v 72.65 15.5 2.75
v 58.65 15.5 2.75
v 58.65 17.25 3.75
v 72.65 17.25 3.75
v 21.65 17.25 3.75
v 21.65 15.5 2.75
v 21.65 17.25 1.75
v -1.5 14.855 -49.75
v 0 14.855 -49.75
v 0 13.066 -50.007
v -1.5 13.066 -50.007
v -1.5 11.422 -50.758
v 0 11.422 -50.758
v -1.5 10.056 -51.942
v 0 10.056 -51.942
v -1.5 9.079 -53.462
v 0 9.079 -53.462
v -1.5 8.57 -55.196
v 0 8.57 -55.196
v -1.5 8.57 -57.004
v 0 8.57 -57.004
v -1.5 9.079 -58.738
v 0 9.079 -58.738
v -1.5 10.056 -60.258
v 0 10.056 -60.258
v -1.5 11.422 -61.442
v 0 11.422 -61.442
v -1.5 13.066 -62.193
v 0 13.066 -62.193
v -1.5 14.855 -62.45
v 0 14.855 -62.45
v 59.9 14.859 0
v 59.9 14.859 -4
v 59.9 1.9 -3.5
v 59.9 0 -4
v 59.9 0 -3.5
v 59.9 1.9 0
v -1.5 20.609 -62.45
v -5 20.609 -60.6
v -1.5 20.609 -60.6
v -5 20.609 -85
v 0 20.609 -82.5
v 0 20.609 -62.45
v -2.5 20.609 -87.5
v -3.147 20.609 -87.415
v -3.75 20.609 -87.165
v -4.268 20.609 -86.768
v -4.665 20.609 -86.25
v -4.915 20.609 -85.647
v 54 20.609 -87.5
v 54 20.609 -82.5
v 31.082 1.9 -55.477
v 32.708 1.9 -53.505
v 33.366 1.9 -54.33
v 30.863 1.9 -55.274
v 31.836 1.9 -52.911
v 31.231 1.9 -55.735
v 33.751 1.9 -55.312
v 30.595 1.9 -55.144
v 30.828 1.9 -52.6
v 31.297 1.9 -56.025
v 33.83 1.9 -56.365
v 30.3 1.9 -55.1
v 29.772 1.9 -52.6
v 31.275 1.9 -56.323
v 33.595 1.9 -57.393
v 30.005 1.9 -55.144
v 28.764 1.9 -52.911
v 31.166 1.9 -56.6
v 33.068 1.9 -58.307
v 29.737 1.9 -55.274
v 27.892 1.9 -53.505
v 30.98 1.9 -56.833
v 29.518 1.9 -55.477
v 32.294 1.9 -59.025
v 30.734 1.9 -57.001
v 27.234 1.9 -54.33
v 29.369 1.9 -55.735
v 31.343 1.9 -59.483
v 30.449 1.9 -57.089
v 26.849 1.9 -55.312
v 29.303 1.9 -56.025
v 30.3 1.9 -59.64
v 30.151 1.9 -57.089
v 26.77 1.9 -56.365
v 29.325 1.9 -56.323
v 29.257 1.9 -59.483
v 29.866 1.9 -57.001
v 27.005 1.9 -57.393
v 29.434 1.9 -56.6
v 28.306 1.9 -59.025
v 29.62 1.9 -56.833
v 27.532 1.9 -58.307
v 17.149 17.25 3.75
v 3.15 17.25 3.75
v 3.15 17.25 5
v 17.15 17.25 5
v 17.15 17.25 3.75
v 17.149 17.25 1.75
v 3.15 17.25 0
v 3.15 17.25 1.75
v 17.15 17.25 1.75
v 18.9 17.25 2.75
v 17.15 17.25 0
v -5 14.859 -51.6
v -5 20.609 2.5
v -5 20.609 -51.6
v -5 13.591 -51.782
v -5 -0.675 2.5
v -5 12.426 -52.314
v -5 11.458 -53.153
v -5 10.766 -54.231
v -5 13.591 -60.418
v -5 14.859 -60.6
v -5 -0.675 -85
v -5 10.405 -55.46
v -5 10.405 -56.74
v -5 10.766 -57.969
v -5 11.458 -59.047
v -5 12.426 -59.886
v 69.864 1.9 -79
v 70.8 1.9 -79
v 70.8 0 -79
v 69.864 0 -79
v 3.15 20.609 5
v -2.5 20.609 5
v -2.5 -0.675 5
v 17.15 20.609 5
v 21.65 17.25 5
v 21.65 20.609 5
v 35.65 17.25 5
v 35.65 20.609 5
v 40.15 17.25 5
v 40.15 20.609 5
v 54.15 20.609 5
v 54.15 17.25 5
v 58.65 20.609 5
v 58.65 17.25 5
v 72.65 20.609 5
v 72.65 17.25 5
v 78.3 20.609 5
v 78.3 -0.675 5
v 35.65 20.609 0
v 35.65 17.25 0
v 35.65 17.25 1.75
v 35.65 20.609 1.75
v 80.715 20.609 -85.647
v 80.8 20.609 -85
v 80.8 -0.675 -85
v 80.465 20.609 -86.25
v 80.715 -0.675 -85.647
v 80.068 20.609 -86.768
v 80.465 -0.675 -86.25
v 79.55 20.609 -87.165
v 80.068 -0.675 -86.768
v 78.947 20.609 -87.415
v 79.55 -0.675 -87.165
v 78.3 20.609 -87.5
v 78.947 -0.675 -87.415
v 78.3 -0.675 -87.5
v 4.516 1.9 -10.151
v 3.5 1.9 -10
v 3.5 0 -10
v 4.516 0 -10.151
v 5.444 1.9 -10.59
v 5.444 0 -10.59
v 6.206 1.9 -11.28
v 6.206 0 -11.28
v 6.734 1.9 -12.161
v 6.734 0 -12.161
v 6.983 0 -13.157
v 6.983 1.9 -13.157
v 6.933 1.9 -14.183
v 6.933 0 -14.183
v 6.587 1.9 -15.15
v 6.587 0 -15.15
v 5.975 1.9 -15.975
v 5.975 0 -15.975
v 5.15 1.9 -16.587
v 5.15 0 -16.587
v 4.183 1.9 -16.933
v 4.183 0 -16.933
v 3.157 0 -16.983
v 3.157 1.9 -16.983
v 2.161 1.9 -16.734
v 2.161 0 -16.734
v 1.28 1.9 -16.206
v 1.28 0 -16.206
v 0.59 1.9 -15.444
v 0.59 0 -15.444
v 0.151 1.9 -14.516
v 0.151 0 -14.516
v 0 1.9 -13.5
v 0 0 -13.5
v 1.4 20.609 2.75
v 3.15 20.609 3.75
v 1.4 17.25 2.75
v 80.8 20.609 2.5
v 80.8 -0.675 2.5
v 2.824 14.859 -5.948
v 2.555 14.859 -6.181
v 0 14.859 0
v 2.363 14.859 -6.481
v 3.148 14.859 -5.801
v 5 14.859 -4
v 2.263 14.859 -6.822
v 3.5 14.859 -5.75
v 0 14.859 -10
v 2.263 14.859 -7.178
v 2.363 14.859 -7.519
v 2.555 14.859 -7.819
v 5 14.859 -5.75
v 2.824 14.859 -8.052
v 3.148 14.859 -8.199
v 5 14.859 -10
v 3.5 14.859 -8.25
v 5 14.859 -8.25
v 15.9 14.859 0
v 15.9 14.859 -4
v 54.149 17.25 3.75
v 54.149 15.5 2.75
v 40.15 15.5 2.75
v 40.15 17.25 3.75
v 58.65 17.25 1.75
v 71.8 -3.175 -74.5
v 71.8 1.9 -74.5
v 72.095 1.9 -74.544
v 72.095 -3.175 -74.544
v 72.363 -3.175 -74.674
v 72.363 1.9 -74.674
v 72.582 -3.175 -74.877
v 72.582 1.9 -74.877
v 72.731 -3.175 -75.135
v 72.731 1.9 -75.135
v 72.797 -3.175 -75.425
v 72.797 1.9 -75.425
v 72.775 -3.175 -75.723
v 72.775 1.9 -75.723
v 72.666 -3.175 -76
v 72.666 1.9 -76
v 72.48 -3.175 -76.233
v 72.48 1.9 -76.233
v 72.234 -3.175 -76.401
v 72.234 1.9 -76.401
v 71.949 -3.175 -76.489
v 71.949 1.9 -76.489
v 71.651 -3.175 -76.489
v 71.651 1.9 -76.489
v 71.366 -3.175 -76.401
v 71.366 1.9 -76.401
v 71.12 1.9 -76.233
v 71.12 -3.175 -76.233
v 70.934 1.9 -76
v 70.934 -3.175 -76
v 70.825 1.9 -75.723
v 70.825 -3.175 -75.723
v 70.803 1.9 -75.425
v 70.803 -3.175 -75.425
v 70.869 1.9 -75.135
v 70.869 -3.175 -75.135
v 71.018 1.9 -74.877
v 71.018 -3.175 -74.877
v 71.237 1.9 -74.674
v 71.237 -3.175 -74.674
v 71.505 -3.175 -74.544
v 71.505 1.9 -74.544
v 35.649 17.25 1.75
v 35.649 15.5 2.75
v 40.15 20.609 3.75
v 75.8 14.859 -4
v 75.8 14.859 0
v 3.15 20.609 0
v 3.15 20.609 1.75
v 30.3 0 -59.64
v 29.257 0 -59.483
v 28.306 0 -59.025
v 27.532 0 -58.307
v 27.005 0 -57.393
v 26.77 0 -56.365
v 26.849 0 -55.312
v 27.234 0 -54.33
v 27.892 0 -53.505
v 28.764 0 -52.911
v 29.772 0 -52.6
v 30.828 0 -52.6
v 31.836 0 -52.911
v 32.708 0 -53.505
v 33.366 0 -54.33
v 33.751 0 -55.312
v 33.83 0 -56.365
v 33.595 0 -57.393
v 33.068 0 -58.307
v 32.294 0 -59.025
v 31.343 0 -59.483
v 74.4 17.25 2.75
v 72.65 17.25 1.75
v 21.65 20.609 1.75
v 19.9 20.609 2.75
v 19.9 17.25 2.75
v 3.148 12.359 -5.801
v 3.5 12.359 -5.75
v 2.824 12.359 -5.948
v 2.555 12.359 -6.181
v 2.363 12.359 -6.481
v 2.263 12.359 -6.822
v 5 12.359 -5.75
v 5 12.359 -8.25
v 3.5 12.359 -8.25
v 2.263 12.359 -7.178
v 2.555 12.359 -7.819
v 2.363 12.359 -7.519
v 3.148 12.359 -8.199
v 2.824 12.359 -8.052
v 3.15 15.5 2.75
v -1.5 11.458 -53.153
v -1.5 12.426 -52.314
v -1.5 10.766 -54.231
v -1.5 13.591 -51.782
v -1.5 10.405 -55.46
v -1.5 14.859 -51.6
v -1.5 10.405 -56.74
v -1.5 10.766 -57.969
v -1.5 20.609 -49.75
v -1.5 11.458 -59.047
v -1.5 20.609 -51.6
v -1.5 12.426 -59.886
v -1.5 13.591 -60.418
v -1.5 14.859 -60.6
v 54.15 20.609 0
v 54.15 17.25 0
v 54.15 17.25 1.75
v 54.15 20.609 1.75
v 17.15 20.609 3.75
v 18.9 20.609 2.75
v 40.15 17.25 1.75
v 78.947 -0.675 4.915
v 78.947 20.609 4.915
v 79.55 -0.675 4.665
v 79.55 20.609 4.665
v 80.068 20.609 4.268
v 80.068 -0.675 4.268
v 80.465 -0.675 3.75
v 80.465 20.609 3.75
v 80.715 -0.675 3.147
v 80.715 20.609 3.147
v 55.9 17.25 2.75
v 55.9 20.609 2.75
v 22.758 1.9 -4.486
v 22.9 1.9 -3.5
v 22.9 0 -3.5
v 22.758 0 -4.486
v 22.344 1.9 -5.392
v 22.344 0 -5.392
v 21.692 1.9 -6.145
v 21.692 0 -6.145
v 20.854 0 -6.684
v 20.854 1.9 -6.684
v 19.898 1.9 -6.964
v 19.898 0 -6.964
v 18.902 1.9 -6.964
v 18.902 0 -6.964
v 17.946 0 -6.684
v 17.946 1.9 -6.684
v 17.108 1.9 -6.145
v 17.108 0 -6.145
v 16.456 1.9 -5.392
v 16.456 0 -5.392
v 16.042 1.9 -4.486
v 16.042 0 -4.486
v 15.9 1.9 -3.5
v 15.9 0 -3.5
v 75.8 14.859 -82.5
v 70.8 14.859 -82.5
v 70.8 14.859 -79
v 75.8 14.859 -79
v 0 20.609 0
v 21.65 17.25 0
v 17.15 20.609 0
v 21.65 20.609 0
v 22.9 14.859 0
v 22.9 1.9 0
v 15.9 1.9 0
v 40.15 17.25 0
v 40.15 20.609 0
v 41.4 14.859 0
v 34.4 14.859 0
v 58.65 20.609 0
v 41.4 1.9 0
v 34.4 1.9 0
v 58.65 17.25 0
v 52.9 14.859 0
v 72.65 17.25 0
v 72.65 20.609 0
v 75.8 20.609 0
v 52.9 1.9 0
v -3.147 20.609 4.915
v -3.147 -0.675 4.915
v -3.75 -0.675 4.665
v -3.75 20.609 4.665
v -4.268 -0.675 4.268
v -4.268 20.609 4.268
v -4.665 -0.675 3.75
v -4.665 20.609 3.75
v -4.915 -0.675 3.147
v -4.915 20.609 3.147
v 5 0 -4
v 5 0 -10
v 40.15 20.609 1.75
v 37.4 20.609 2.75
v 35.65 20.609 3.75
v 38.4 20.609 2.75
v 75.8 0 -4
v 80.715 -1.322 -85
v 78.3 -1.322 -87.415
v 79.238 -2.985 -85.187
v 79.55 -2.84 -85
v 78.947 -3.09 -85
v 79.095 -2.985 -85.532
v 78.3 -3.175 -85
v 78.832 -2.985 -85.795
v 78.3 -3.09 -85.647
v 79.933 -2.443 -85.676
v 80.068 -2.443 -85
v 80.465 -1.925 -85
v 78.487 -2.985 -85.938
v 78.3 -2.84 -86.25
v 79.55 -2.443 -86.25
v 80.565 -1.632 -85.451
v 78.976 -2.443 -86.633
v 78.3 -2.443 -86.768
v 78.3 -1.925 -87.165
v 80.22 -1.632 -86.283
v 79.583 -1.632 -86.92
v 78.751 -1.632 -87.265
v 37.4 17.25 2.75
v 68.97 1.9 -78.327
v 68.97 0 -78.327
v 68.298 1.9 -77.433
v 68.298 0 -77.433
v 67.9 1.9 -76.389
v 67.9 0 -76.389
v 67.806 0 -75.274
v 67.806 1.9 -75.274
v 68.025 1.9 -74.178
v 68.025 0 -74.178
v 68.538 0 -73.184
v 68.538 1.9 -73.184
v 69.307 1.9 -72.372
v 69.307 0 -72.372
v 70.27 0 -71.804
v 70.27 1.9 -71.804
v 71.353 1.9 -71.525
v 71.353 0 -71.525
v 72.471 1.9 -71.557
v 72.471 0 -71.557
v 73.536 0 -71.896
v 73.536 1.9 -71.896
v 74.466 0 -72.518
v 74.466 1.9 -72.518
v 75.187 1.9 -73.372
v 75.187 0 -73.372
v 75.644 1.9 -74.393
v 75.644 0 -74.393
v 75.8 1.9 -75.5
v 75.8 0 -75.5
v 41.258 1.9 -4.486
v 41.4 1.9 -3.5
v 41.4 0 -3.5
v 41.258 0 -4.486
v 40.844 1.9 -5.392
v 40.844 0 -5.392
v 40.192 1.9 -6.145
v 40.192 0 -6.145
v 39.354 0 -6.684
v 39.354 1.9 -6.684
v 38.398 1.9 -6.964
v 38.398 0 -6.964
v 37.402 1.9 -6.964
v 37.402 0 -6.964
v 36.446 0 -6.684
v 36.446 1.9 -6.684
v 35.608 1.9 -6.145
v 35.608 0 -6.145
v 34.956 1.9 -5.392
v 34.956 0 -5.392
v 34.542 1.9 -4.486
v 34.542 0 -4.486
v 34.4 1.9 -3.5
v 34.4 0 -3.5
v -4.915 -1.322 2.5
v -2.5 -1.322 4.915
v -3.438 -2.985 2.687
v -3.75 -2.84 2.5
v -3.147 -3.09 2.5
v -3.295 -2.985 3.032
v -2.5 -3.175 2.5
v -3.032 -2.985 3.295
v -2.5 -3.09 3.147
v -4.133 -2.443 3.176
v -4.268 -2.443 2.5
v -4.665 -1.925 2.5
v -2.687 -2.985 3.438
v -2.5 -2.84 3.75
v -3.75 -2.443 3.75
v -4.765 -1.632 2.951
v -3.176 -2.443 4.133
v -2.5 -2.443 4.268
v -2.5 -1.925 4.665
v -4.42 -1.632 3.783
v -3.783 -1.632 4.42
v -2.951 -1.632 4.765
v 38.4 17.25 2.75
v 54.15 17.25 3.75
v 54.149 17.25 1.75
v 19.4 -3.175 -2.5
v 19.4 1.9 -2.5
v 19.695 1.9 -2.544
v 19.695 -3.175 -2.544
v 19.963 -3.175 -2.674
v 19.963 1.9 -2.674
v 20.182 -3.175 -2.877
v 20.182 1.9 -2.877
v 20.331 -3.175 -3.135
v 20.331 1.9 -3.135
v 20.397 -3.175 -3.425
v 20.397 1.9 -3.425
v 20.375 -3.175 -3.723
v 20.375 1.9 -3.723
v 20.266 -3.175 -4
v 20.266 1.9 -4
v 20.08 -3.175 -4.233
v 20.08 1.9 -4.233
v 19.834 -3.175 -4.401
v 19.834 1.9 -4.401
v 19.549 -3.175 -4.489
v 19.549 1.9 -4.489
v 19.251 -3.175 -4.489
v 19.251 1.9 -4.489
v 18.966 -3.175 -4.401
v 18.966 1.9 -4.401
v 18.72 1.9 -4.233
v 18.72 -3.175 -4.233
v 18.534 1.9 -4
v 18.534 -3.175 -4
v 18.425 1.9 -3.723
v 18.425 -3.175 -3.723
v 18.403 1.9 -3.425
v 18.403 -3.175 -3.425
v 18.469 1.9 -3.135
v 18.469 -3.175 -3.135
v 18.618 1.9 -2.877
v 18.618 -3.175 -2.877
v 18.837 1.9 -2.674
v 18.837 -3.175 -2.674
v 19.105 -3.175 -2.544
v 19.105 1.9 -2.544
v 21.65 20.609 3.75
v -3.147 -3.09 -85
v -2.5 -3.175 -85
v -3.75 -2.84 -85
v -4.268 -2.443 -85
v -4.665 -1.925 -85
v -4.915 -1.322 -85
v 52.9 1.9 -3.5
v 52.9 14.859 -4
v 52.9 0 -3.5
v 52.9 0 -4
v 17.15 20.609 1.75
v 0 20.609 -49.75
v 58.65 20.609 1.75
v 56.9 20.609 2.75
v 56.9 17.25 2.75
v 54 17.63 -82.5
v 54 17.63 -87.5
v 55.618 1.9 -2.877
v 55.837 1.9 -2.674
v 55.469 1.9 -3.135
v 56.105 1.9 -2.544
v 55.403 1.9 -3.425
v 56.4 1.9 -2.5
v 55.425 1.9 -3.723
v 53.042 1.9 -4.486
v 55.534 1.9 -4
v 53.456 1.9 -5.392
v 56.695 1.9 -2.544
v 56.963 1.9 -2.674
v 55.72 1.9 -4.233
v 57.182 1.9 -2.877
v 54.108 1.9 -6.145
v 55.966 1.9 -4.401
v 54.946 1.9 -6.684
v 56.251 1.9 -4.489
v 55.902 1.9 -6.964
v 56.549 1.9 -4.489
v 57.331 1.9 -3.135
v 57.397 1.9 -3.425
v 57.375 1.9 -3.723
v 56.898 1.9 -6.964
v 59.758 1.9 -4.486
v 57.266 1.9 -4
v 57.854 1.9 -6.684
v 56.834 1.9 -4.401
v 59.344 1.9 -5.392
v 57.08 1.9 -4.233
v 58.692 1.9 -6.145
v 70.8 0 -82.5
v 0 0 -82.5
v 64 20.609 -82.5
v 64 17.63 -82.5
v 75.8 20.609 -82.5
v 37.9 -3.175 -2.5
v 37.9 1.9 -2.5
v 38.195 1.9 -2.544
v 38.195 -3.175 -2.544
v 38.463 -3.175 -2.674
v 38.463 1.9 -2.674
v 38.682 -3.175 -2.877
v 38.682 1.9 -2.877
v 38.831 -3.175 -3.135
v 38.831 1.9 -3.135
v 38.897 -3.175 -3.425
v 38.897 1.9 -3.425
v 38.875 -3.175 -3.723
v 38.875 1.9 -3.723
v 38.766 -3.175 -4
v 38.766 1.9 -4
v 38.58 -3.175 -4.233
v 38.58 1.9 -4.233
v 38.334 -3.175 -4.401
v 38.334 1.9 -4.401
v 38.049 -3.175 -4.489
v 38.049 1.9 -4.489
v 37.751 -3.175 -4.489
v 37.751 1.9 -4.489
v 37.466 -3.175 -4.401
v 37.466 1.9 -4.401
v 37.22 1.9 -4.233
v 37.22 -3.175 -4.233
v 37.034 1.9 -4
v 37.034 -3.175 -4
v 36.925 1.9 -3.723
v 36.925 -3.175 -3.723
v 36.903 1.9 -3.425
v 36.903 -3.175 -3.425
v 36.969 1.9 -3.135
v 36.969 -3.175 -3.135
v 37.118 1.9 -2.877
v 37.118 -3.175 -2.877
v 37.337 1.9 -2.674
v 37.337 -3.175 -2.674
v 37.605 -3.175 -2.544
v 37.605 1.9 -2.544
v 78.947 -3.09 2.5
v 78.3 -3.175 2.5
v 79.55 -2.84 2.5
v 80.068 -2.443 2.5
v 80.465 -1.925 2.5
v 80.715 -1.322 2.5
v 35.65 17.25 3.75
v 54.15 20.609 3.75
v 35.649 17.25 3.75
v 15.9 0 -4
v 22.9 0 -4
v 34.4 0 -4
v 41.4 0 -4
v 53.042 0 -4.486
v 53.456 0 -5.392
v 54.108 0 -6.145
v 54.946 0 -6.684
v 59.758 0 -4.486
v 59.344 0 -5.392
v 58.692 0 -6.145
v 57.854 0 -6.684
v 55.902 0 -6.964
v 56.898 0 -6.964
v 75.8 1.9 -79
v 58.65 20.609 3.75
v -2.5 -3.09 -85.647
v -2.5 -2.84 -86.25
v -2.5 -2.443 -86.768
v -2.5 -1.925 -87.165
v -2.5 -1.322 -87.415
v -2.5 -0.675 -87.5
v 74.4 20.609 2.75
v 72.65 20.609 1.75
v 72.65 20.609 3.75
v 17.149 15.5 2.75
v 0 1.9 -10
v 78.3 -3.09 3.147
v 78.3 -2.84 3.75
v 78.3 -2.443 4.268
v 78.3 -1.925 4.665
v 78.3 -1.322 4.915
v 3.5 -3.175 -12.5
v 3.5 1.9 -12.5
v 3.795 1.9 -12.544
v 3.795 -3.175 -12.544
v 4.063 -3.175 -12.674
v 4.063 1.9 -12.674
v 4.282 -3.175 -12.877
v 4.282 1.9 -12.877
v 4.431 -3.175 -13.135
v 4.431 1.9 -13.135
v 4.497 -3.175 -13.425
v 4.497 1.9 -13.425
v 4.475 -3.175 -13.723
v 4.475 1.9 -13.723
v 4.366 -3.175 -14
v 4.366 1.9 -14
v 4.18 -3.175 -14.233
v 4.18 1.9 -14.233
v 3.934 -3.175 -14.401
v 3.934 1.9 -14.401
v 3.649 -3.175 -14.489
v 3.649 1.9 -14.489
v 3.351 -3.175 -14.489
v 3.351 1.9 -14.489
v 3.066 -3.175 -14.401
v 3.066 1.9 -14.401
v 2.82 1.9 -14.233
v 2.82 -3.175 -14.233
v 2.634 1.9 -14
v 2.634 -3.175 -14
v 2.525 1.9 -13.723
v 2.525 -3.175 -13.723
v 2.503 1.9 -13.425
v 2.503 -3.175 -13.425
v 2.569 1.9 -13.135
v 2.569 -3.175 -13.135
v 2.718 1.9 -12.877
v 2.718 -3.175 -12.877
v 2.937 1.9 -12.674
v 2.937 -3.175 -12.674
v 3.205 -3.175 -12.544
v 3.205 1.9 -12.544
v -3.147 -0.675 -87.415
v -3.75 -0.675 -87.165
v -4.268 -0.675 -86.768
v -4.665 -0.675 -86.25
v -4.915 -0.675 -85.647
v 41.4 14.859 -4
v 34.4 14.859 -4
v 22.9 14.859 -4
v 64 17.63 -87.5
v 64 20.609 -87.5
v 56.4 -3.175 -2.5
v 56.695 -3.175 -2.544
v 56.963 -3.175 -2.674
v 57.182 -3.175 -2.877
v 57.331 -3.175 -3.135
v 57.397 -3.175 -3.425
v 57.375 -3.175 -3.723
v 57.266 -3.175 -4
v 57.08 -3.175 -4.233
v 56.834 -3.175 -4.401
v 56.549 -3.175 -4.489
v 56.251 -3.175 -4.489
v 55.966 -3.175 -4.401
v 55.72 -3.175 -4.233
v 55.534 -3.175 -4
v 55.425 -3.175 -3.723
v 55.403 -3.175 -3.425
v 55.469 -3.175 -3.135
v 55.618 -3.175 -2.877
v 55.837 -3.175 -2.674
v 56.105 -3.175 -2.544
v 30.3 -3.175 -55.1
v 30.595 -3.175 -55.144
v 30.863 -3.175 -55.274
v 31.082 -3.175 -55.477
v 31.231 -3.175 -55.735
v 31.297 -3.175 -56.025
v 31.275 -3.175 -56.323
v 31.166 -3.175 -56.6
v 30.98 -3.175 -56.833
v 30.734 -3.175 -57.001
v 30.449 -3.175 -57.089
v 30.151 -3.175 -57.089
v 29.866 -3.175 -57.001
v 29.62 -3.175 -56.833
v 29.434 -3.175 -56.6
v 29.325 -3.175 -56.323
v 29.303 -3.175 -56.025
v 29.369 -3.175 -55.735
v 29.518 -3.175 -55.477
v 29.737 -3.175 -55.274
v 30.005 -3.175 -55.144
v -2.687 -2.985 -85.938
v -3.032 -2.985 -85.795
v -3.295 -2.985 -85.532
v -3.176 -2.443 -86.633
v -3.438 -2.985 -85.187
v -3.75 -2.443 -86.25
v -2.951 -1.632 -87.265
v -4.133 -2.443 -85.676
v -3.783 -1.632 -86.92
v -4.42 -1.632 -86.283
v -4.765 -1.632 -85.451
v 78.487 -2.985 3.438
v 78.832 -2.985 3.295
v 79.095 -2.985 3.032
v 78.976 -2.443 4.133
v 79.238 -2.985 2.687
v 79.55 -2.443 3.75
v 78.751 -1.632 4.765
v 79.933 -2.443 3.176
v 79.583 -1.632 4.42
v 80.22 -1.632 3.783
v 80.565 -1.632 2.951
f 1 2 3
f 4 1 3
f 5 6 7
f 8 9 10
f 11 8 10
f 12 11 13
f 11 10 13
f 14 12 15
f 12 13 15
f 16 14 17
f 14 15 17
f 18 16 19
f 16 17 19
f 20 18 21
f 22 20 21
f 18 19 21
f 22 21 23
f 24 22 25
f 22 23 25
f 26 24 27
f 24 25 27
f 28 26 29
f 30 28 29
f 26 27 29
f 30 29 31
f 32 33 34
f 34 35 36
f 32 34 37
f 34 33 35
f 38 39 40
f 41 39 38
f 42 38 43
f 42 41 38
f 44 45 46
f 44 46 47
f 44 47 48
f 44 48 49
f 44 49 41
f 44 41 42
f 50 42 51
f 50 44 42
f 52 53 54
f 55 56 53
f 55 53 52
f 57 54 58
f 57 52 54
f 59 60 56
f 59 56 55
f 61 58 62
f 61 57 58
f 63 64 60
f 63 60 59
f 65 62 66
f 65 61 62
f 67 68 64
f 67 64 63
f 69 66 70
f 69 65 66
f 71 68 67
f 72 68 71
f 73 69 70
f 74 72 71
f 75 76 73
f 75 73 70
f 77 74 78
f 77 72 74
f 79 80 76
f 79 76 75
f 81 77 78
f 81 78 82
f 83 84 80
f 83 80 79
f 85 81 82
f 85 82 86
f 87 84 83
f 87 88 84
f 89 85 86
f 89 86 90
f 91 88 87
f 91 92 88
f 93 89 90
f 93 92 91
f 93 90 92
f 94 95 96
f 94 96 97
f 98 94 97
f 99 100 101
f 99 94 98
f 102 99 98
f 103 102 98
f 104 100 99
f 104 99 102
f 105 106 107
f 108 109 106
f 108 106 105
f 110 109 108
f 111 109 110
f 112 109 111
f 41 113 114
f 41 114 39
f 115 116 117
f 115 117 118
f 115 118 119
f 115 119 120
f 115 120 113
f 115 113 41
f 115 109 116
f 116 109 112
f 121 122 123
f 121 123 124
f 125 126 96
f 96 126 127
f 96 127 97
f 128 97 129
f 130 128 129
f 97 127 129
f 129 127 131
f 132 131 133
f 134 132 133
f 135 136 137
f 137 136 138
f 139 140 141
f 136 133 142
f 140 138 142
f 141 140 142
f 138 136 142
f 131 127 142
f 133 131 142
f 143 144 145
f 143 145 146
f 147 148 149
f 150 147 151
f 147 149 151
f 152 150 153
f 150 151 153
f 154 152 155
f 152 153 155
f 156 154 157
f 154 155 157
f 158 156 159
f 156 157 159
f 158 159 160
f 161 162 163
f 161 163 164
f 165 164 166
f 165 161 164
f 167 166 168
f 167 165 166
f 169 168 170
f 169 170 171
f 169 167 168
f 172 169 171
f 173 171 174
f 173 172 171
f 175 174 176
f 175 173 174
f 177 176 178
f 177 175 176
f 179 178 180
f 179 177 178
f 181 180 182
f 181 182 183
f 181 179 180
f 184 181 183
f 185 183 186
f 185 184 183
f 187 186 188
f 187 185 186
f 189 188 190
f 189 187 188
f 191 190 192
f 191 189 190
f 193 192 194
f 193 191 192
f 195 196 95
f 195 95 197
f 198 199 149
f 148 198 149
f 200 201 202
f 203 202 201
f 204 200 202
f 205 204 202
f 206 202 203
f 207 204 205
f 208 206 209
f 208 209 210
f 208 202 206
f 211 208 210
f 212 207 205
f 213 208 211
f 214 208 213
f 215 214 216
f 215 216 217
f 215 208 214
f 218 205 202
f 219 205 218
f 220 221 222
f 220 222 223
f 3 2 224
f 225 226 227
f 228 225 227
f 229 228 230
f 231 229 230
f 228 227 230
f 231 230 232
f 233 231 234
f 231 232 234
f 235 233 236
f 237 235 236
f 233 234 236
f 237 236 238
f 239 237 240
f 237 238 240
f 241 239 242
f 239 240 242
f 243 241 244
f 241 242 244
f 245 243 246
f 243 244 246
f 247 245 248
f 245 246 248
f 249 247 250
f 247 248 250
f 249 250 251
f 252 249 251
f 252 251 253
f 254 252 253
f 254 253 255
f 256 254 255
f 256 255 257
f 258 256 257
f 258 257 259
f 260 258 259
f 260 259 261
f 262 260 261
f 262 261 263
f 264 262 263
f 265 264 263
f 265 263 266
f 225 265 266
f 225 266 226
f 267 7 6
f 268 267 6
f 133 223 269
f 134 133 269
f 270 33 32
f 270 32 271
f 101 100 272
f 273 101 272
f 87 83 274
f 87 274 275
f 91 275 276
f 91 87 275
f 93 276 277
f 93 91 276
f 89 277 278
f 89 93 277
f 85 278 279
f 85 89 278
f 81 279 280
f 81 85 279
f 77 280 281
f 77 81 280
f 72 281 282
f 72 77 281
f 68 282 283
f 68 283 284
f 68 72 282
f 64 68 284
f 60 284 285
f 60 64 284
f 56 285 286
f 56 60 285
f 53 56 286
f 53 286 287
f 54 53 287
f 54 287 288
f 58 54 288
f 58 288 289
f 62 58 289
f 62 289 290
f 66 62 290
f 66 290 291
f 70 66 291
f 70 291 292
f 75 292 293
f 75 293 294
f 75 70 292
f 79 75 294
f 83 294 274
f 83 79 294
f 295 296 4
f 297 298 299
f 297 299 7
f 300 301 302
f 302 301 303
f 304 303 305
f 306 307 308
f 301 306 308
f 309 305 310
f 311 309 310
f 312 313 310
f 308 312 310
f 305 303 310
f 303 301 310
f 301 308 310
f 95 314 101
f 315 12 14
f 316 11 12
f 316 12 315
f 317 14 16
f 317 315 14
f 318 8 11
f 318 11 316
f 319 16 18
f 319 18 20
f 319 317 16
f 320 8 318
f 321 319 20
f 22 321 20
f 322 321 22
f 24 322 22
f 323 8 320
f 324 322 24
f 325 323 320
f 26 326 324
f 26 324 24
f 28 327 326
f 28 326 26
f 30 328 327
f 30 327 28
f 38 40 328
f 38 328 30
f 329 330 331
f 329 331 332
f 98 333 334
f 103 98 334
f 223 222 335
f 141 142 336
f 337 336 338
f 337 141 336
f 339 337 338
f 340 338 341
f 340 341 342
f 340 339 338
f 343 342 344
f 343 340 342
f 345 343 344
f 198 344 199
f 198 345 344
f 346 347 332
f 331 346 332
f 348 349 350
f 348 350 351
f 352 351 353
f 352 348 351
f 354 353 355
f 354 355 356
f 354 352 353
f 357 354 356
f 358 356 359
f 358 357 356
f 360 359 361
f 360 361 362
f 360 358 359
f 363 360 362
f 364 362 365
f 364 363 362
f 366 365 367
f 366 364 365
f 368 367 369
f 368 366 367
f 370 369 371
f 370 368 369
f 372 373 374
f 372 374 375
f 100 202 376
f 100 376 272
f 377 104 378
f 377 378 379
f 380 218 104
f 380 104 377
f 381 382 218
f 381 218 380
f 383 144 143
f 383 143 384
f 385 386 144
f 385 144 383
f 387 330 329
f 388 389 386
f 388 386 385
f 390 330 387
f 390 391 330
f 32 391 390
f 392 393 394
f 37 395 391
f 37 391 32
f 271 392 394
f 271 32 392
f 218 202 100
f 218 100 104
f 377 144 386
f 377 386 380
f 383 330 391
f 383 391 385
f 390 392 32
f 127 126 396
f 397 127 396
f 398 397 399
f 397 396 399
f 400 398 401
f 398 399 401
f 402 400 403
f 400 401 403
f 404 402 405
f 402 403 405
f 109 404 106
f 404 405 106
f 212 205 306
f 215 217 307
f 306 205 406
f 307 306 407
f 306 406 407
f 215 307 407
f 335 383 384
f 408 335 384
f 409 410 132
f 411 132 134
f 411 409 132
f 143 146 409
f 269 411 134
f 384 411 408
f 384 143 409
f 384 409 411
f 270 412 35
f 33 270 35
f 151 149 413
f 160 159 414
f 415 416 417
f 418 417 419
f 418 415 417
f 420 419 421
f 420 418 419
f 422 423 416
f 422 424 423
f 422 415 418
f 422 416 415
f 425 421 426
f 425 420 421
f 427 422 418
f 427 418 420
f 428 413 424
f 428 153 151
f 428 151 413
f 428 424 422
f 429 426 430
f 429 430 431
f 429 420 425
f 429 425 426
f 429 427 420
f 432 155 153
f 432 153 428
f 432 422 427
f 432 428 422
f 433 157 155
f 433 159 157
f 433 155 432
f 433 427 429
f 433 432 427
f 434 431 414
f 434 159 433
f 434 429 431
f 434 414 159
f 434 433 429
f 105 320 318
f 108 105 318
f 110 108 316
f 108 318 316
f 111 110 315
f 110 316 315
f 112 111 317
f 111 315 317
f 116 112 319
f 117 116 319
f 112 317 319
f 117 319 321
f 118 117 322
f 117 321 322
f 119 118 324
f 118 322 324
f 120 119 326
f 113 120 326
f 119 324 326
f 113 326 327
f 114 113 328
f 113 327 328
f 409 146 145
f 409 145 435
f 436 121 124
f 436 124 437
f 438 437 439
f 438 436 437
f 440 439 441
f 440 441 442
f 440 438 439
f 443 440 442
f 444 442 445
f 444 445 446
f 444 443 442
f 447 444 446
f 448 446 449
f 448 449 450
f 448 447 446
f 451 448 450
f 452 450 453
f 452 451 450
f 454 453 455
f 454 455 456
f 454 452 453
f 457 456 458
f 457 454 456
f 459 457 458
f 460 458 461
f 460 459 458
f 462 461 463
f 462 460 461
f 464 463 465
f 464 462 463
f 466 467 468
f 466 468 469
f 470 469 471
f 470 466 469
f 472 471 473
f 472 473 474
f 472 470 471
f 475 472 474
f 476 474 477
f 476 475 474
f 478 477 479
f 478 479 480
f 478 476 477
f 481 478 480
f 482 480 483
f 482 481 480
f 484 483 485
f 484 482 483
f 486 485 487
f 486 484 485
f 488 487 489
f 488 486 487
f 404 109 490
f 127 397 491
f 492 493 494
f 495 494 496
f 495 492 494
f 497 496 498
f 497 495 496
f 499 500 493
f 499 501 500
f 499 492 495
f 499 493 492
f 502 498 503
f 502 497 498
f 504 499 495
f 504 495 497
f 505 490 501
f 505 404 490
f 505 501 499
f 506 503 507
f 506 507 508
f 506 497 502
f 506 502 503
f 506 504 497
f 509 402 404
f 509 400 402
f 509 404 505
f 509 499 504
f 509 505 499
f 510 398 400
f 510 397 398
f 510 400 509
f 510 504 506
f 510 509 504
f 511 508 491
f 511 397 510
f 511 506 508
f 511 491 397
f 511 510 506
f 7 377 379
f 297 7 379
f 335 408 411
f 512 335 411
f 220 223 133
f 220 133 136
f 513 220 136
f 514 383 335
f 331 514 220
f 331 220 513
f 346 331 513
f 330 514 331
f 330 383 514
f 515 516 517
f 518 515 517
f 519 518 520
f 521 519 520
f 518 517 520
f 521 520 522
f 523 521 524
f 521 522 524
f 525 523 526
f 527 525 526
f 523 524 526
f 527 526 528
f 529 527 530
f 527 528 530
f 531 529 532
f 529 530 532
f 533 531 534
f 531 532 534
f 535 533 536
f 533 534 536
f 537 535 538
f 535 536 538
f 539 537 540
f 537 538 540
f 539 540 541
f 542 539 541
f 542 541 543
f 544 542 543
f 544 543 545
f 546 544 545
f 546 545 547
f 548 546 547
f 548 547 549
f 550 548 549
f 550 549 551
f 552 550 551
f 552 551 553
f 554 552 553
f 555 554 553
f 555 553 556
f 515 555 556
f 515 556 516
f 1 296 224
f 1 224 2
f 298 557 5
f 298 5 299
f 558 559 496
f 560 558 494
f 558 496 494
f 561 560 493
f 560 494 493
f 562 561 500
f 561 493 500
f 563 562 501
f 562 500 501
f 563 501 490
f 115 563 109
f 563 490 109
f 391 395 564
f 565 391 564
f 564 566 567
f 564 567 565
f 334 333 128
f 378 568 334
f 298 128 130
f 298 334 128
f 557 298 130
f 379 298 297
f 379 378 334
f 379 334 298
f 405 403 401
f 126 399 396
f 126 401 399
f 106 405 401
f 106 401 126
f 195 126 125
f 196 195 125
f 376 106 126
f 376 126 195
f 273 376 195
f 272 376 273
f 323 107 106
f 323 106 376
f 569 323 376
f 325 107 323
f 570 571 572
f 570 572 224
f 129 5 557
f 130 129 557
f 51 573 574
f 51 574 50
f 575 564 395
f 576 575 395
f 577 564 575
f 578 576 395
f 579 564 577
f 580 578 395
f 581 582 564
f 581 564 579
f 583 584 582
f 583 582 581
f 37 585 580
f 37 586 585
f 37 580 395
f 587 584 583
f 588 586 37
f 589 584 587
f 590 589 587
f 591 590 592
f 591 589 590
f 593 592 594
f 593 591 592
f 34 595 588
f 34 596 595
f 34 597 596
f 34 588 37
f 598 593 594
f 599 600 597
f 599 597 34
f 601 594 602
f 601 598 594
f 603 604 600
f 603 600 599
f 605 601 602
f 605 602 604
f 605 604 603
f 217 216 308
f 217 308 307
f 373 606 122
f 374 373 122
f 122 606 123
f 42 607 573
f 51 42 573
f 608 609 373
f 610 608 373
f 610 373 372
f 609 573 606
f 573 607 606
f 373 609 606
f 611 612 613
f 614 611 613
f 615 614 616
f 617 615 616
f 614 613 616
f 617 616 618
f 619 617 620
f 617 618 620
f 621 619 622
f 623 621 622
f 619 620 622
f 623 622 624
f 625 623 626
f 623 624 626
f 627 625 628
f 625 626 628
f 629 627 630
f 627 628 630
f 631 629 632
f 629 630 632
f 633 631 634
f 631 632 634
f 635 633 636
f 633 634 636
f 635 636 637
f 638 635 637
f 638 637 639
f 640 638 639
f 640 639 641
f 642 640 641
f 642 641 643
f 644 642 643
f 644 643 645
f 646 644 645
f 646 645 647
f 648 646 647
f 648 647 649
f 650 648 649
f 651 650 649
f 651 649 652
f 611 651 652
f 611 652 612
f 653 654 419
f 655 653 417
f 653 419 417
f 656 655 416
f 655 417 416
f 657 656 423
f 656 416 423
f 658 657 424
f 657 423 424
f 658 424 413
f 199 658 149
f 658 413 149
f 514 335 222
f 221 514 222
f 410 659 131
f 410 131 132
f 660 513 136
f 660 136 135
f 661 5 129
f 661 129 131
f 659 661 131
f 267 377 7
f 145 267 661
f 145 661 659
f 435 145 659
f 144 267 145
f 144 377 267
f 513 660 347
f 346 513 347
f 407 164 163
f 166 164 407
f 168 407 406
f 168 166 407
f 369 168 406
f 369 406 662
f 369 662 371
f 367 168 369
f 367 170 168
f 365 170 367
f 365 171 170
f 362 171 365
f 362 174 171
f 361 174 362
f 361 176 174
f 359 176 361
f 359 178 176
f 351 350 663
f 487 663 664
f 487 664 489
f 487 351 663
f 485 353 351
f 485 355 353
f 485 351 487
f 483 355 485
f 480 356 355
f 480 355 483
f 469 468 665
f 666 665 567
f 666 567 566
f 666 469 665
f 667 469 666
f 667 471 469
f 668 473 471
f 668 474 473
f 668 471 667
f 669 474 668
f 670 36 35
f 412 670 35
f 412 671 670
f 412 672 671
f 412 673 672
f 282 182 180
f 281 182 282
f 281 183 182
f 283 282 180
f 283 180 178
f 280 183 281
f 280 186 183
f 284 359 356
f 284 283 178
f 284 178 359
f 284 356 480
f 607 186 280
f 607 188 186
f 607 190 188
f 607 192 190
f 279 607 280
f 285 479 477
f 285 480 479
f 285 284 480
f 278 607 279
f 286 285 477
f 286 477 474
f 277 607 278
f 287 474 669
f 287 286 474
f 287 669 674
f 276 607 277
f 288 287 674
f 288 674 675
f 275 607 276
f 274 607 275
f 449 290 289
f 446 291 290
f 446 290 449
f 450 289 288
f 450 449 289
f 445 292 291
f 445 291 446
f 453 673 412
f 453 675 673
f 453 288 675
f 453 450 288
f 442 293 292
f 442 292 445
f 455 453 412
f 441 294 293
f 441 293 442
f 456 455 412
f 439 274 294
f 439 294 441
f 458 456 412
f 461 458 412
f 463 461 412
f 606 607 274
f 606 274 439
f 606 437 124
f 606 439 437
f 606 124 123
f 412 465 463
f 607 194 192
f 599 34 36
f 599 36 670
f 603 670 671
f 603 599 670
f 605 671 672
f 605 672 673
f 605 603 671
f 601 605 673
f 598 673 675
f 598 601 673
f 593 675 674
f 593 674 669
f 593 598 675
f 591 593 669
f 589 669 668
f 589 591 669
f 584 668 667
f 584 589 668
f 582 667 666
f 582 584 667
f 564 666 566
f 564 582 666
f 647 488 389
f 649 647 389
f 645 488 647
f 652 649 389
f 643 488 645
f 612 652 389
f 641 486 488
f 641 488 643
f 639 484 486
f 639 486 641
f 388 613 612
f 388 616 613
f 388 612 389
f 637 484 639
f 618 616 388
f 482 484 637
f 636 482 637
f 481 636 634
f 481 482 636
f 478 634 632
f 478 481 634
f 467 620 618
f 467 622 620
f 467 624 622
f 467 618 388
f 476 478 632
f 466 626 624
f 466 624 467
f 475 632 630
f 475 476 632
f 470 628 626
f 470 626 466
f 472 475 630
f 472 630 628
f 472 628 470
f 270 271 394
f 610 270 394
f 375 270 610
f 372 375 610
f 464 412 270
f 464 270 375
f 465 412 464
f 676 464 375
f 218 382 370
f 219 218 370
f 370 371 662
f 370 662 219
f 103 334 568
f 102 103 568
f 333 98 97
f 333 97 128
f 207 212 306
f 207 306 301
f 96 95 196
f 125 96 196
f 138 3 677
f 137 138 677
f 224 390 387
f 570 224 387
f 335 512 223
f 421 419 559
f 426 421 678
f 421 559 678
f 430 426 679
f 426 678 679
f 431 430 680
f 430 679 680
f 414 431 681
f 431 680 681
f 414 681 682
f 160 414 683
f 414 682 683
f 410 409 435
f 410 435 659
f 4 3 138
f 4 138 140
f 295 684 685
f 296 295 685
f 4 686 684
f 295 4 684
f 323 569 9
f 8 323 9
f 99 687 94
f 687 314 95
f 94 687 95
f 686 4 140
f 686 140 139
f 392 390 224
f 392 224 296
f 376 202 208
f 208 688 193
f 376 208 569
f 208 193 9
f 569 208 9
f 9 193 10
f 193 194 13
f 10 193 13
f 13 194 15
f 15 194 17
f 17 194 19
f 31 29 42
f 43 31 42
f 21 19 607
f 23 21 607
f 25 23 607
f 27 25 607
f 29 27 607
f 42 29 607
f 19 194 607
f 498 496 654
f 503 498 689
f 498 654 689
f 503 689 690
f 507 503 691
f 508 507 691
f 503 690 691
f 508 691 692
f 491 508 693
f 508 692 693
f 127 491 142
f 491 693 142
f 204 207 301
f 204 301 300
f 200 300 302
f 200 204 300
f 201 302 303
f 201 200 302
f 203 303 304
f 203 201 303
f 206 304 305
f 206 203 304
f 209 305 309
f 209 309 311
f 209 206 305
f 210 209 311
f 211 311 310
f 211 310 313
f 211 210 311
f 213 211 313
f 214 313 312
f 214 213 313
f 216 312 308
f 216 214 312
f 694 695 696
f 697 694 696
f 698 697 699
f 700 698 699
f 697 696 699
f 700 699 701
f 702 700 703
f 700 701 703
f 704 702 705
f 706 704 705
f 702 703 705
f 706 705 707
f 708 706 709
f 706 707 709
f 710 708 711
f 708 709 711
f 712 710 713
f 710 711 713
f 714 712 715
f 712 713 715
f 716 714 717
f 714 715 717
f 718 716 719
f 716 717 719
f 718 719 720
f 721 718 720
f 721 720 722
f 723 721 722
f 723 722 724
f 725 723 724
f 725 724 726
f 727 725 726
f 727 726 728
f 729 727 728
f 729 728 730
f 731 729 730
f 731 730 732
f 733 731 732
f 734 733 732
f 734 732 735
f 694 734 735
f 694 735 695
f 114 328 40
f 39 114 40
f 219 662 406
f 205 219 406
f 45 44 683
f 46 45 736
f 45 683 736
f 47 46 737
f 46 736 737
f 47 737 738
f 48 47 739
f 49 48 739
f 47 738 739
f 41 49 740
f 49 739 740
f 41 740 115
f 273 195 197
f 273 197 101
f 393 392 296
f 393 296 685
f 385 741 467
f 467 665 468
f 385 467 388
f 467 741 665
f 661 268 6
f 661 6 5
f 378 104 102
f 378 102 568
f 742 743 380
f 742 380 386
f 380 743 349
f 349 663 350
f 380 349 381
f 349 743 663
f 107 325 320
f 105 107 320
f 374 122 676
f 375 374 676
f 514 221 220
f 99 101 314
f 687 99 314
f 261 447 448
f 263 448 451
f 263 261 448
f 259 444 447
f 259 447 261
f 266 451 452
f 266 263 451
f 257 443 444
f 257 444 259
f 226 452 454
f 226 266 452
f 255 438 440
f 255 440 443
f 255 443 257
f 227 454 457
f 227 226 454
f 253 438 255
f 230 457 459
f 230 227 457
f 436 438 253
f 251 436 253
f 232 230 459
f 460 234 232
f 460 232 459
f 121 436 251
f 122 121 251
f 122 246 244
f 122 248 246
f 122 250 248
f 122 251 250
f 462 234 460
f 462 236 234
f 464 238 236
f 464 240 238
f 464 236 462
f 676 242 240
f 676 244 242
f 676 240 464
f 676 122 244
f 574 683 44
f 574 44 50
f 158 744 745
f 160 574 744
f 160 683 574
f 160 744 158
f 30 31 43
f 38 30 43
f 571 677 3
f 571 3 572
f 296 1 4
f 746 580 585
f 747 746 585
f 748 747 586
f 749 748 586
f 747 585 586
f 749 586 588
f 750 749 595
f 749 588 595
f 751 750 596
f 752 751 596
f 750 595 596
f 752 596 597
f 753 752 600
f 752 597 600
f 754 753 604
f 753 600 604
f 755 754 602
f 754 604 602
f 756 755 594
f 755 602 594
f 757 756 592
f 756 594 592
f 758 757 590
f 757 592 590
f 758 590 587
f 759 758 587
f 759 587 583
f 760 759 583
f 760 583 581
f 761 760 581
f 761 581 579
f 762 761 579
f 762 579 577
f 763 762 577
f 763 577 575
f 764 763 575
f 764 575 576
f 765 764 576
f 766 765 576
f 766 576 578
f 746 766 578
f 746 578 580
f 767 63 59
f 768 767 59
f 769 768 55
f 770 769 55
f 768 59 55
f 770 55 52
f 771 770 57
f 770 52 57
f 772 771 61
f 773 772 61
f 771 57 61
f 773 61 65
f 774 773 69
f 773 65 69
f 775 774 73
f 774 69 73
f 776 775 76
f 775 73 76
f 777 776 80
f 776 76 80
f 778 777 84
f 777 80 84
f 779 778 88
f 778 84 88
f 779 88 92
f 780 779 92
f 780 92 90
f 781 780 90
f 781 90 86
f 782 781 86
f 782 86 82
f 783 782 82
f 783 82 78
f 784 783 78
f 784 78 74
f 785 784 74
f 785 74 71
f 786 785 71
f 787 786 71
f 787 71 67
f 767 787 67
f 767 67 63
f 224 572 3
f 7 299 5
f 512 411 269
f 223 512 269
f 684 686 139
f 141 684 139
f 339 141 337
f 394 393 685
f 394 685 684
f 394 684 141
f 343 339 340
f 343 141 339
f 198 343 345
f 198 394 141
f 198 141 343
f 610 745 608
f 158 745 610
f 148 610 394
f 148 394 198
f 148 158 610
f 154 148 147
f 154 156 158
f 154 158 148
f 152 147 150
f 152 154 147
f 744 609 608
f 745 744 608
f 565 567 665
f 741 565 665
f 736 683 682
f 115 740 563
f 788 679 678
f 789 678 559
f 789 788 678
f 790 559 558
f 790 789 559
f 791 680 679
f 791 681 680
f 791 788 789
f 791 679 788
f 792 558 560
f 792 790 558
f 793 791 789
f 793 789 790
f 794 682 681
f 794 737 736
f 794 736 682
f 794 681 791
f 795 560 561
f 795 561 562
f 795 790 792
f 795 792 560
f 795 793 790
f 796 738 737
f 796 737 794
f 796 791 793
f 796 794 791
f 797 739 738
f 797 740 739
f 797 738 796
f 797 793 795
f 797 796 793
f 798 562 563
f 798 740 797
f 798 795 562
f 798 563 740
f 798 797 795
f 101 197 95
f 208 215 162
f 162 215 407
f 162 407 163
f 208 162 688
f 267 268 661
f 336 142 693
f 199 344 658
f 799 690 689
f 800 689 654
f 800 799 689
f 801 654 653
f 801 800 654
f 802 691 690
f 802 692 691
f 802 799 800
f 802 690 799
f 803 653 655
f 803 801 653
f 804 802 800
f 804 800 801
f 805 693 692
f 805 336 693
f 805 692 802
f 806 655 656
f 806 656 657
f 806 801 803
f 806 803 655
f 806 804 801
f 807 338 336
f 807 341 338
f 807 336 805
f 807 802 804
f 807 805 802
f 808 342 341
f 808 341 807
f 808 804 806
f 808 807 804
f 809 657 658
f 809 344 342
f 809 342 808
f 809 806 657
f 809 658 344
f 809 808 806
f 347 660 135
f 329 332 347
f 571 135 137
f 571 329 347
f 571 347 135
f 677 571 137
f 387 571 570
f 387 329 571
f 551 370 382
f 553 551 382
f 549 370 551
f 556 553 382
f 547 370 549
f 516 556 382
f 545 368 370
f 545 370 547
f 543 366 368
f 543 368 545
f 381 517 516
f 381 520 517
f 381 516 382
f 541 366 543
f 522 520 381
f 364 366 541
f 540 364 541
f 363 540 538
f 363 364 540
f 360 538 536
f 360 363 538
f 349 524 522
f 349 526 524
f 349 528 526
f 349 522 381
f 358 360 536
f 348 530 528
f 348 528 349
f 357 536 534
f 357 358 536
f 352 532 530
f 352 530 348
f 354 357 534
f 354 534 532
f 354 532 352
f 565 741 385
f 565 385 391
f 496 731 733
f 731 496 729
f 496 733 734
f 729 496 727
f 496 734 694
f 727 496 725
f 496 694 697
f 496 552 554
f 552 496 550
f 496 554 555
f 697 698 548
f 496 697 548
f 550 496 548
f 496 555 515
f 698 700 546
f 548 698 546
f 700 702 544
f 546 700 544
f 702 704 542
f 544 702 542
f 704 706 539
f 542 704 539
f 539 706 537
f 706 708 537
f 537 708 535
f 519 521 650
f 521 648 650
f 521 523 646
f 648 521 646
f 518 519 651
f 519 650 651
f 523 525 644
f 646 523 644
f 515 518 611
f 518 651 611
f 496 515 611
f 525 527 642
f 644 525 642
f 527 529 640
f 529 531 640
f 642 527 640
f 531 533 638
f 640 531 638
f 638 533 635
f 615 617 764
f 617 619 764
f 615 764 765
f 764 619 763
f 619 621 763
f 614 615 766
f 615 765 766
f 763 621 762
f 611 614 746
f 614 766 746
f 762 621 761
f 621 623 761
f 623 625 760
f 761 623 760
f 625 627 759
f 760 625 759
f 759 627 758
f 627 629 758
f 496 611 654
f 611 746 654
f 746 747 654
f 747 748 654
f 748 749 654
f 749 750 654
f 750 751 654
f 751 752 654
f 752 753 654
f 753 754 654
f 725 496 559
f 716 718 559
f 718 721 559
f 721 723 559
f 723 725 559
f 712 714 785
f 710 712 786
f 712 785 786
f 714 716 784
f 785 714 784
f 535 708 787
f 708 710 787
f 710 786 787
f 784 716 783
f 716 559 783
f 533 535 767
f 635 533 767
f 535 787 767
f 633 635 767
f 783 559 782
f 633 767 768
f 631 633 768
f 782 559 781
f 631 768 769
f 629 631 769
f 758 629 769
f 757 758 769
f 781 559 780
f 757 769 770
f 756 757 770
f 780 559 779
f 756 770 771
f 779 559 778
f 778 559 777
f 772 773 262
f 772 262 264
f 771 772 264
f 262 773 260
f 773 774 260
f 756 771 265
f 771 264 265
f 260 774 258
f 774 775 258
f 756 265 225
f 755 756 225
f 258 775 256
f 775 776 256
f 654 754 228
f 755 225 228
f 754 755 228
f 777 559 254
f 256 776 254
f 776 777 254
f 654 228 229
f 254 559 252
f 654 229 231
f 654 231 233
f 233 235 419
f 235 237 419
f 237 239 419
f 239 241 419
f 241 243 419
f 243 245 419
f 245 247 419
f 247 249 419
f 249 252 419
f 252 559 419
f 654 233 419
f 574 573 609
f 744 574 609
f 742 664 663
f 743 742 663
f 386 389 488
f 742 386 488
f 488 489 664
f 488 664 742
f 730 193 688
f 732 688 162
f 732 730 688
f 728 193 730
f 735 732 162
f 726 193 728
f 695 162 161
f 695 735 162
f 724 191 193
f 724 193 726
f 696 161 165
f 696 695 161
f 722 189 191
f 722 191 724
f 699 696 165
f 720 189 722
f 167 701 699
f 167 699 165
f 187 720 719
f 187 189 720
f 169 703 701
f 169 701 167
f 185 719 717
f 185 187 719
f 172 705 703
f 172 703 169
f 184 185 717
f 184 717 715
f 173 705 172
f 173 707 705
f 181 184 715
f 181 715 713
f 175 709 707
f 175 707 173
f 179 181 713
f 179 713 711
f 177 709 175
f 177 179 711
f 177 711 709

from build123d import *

# Parameters (mm, degrees)
SKETCH1_W           = 85.8
SKETCH1_H           = 92.5
BOSS_EXTRUDE1_DEPTH = 14.859
SKETCH2_W           = 85.8
SKETCH2_H           = 92.5
SKETCH2_R           = 1
BOSS_EXTRUDE2_DEPTH = 3.175
SKETCH4_W           = 85.8
SKETCH4_H           = 92.5
SKETCH4_W_2         = 75.8
SKETCH4_H_2         = 82.5
BOSS_EXTRUDE3_DEPTH = 5.75
CUT_EXTRUDE1_DEPTH  = 121.870264668
SKETCH5_W           = 14
SKETCH5_H           = 8
CUT_EXTRUDE2_DEPTH  = 121.870264668
SKETCH6_W           = 10
SKETCH6_H           = 6
CUT_EXTRUDE3_DEPTH  = 121.870264668
BOSS_EXTRUDE4_START = 1.9
SKETCH7_R           = 3.54
SKETCH7_R_2         = 1
BOSS_EXTRUDE4_DEPTH = 1.9
FILLET1_R           = 2.5
FILLET2_R           = 2.5
FILLET3_R           = 2.5
FILLET4_R           = 2.5
FILLET5_R           = 2.5
CUT_EXTRUDE4_DEPTH  = 1.5
CUT_EXTRUDE5_DEPTH  = 4
CUT_EXTRUDE7_DEPTH  = 73.9
SKETCH12_W          = 4.501
SKETCH12_H          = 4
BOSS_EXTRUDE8_DEPTH = 5
CUT_EXTRUDE8_DEPTH  = 2.5


with BuildPart() as part:
    # Sketch1 → Boss-Extrude1 (new body)
    with BuildSketch(Plane(origin=(0, 0, 0), x_dir=(1, 0, 0), z_dir=(0, 1, 0))):
        with Locations((37.9, 41.25)):
            Rectangle(SKETCH1_W, SKETCH1_H)
        Polygon((5, 4), (5, 10), (0, 10), (0, 82.5), (70.8, 82.5), (70.8, 79), (75.8, 79), (75.8, 4), (59.9, 4), (59.9, 0), (52.9, 0), (52.9, 4), (41.4, 4), (41.4, 0), (34.4, 0), (34.4, 4), (22.9, 4), (22.9, 0), (15.9, 0), (15.9, 4), align=None, mode=Mode.SUBTRACT)
    extrude(amount=BOSS_EXTRUDE1_DEPTH)

    # Sketch2 → Boss-Extrude2 (add)
    with BuildSketch(Plane(origin=(0, 0, 0), x_dir=(1, 0, 0), z_dir=(0, 1, 0))):
        with Locations((37.9, 41.25)):
            Rectangle(SKETCH2_W, SKETCH2_H)
        with Locations(Location((3.5, 13.5, 0), (0, 0, 270))):
            Circle(SKETCH2_R, mode=Mode.SUBTRACT)
        with Locations(Location((19.4, 3.5, 0), (0, 0, 270))):
            Circle(SKETCH2_R, mode=Mode.SUBTRACT)
        with Locations(Location((37.9, 3.5, 0), (0, 0, 270))):
            Circle(SKETCH2_R, mode=Mode.SUBTRACT)
        with Locations(Location((56.4, 3.5, 0), (0, 0, 270))):
            Circle(SKETCH2_R, mode=Mode.SUBTRACT)
        with Locations(Location((30.3, 56.1, 0), (0, 0, 270))):
            Circle(SKETCH2_R, mode=Mode.SUBTRACT)
        with Locations(Location((71.8, 75.5, 0), (0, 0, 270))):
            Circle(SKETCH2_R, mode=Mode.SUBTRACT)
    extrude(amount=-BOSS_EXTRUDE2_DEPTH)

    # Sketch4 → Boss-Extrude3 (add)
    with BuildSketch(Plane(origin=(0, 14.859, 0), x_dir=(1, 0, 0), z_dir=(0, 1, 0))):
        with Locations((37.9, 41.25)):
            Rectangle(SKETCH4_W, SKETCH4_H)
        with Locations((37.9, 41.25)):
            Rectangle(SKETCH4_W_2, SKETCH4_H_2, mode=Mode.SUBTRACT)
    extrude(amount=BOSS_EXTRUDE3_DEPTH)

    # Sketch3 → Cut-Extrude1 (cut, through all)
    with BuildSketch(Plane(origin=(0, 0, 0), x_dir=(0, 0, -1), z_dir=(1, 0, 0))):
        with BuildLine():
            Line((60.6, 14.859), (60.6, 20.609))
            Line((60.6, 20.609), (51.6, 20.609))
            Line((51.6, 20.609), (51.6, 14.859))
            ThreePointArc((51.6, 14.859), (56.1, 10.359), (60.6, 14.859))
        make_face()
    extrude(amount=-CUT_EXTRUDE1_DEPTH, mode=Mode.SUBTRACT)

    # Sketch5 → Cut-Extrude2 (cut, through all)
    with BuildSketch(Plane.XY):
        with Locations((10.15, 21.25)):
            Rectangle(SKETCH5_W, SKETCH5_H)
        with Locations((28.65, 21.25)):
            Rectangle(SKETCH5_W, SKETCH5_H)
        with Locations((47.15, 21.25)):
            Rectangle(SKETCH5_W, SKETCH5_H)
        with Locations((65.65, 21.25)):
            Rectangle(SKETCH5_W, SKETCH5_H)
    extrude(amount=CUT_EXTRUDE2_DEPTH, mode=Mode.SUBTRACT)

    # Sketch6 → Cut-Extrude3 (cut, through all)
    with BuildSketch(Plane.XY):
        with Locations((59, 20.63)):
            Rectangle(SKETCH6_W, SKETCH6_H)
    extrude(amount=-CUT_EXTRUDE3_DEPTH, mode=Mode.SUBTRACT)

    # Sketch7 → Boss-Extrude4 (add)
    # profile 1 of 6: a face of its own
    with BuildSketch(Plane(origin=(0, 0, 0), x_dir=(1, 0, 0), z_dir=(0, 1, 0)).offset(BOSS_EXTRUDE4_START)):
        with Locations(Location((30.3, 56.1, 0), (0, 0, 90))):
            Circle(SKETCH7_R)
        with Locations(Location((30.3, 56.1, 0), (0, 0, 270))):
            Circle(SKETCH7_R_2, mode=Mode.SUBTRACT)
    # profile 2 of 6: a face of its own
    with BuildSketch(Plane(origin=(0, 0, 0), x_dir=(1, 0, 0), z_dir=(0, 1, 0)).offset(BOSS_EXTRUDE4_START)):
        with BuildLine():
            Line((0, 13.5), (0, 10))
            Line((0, 10), (3.5, 10))
            ThreePointArc((3.5, 10), (5.974873734, 15.974873734), (0, 13.5))
        make_face()
        with Locations(Location((3.5, 13.5, 0), (0, 0, 270))):
            Circle(SKETCH7_R_2, mode=Mode.SUBTRACT)
    # profile 3 of 6: a face of its own
    with BuildSketch(Plane(origin=(0, 0, 0), x_dir=(1, 0, 0), z_dir=(0, 1, 0)).offset(BOSS_EXTRUDE4_START)):
        with BuildLine():
            Line((15.9, 3.5), (15.9, 0))
            Line((15.9, 0), (22.9, 0))
            Line((22.9, 0), (22.9, 3.5))
            ThreePointArc((22.9, 3.5), (19.4, 7), (15.9, 3.5))
        make_face()
        with Locations(Location((19.4, 3.5, 0), (0, 0, 270))):
            Circle(SKETCH7_R_2, mode=Mode.SUBTRACT)
    # profile 4 of 6: a face of its own
    with BuildSketch(Plane(origin=(0, 0, 0), x_dir=(1, 0, 0), z_dir=(0, 1, 0)).offset(BOSS_EXTRUDE4_START)):
        with BuildLine():
            Line((34.4, 3.5), (34.4, 0))
            Line((34.4, 0), (41.4, 0))
            Line((41.4, 0), (41.4, 3.5))
            ThreePointArc((41.4, 3.5), (37.9, 7), (34.4, 3.5))
        make_face()
        with Locations(Location((37.9, 3.5, 0), (0, 0, 270))):
            Circle(SKETCH7_R_2, mode=Mode.SUBTRACT)
    # profile 5 of 6: a face of its own
    with BuildSketch(Plane(origin=(0, 0, 0), x_dir=(1, 0, 0), z_dir=(0, 1, 0)).offset(BOSS_EXTRUDE4_START)):
        with BuildLine():
            Line((52.9, 3.5), (52.9, 0))
            Line((52.9, 0), (59.9, 0))
            Line((59.9, 0), (59.9, 3.5))
            ThreePointArc((59.9, 3.5), (56.4, 7), (52.9, 3.5))
        make_face()
        with Locations(Location((56.4, 3.5, 0), (0, 0, 270))):
            Circle(SKETCH7_R_2, mode=Mode.SUBTRACT)
    # profile 6 of 6: a face of its own
    with BuildSketch(Plane(origin=(0, 0, 0), x_dir=(1, 0, 0), z_dir=(0, 1, 0)).offset(BOSS_EXTRUDE4_START)):
        with BuildLine():
            Line((75.8, 79), (69.863508327, 79))
            ThreePointArc((69.863508327, 79), (69.768493994, 72.054280431), (75.8, 75.5))
            Line((75.8, 75.5), (75.8, 79))
        make_face()
        with Locations(Location((71.8, 75.5, 0), (0, 0, 270))):
            Circle(SKETCH7_R_2, mode=Mode.SUBTRACT)
    extrude(amount=-BOSS_EXTRUDE4_DEPTH)

    # Fillet1
    fillet1_edges = [part.edges().sort_by_distance(p)[0] for p in [
        (-5, 8.717, 5),
    ]]
    fillet(fillet1_edges, radius=FILLET1_R)

    # Fillet2
    fillet2_edges = [part.edges().sort_by_distance(p)[0] for p in [
        (80.8, 8.717, 5),
    ]]
    fillet(fillet2_edges, radius=FILLET2_R)

    # Fillet3
    fillet3_edges = [part.edges().sort_by_distance(p)[0] for p in [
        (80.8, 8.717, -87.5),
    ]]
    fillet(fillet3_edges, radius=FILLET3_R)

    # Fillet4
    fillet4_edges = [part.edges().sort_by_distance(p)[0] for p in [
        (-5, 8.717, -87.5),
    ]]
    fillet(fillet4_edges, radius=FILLET4_R)

    # Fillet5
    fillet5_edges = [part.edges().sort_by_distance(p)[0] for p in [
        (37.9, -3.175, 5),
        (-4.267766953, -3.175, 4.267766953),
        (80.8, -3.175, -41.25),
        (80.067766953, -3.175, 4.267766953),
        (37.9, -3.175, -87.5),
        (80.067766953, -3.175, -86.767766953),
        (-5, -3.175, -41.25),
        (-4.267766953, -3.175, -86.767766953),
    ]]
    fillet(fillet5_edges, radius=FILLET5_R)

    # Sketch8 → Cut-Extrude4 (cut)
    with BuildSketch(Plane(origin=(0, 0, 0), x_dir=(0, 0, -1), z_dir=(1, 0, 0))):
        with BuildLine():
            Line((62.45, 14.855), (62.45, 21.205))
            Line((62.45, 21.205), (49.75, 21.205))
            Line((49.75, 21.205), (49.75, 14.855))
            ThreePointArc((49.75, 14.855), (56.1, 8.505), (62.45, 14.855))
        make_face()
    extrude(amount=-CUT_EXTRUDE4_DEPTH, mode=Mode.SUBTRACT)

    # Sketch9 → Cut-Extrude5 (cut)
    with BuildSketch(Plane(origin=(0, 20.609, 0), x_dir=(1, 0, 0), z_dir=(0, 1, 0))):
        Polygon((3.15, -1.75), (3.15, -3.75), (1.4, -2.75), align=None)
        Polygon((17.15, -1.75), (17.15, -3.75), (18.9, -2.75), align=None)
        Polygon((21.65, -1.75), (21.65, -3.75), (19.9, -2.75), align=None)
        Polygon((35.65, -1.75), (37.4, -2.75), (35.65, -3.75), align=None)
        Polygon((40.15, -1.75), (38.4, -2.75), (40.15, -3.75), align=None)
        Polygon((54.15, -1.75), (54.15, -3.75), (55.9, -2.75), align=None)
        Polygon((58.65, -1.75), (58.65, -3.75), (56.9, -2.75), align=None)
        Polygon((72.65, -1.75), (72.65, -3.75), (74.4, -2.75), align=None)
    extrude(amount=-CUT_EXTRUDE5_DEPTH, mode=Mode.SUBTRACT)

    # Sketch10 → Cut-Extrude7 (cut)
    with BuildSketch(Plane(origin=(0, 0, 0), x_dir=(0, 0, -1), z_dir=(1, 0, 0))):
        Polygon((-3.75, 17.25), (-1.75, 17.25), (-2.75, 15.5), align=None)
    extrude(amount=CUT_EXTRUDE7_DEPTH, mode=Mode.SUBTRACT)

    # Sketch12 → Boss-Extrude8 (add)
    with BuildSketch(Plane.XY):
        with Locations((0.8995, 15.25)):
            Rectangle(SKETCH12_W, SKETCH12_H)
        with Locations((19.3995, 15.25)):
            Rectangle(SKETCH12_W, SKETCH12_H)
        with Locations((37.8995, 15.25)):
            Rectangle(SKETCH12_W, SKETCH12_H)
        with Locations((56.3995, 15.25)):
            Rectangle(SKETCH12_W, SKETCH12_H)
        with Locations((74.9005, 15.25)):
            Rectangle(SKETCH12_W, SKETCH12_H)
    extrude(amount=BOSS_EXTRUDE8_DEPTH)

    # Sketch13 → Cut-Extrude8 (cut)
    with BuildSketch(Plane(origin=(0, 14.859, 0), x_dir=(1, 0, 0), z_dir=(0, 1, 0))):
        with BuildLine():
            Line((3.5, 8.25), (5, 8.25))
            Line((5, 8.25), (5, 5.75))
            Line((5, 5.75), (3.5, 5.75))
            ThreePointArc((3.5, 5.75), (2.25, 7), (3.5, 8.25))
        make_face()
    extrude(amount=-CUT_EXTRUDE8_DEPTH, mode=Mode.SUBTRACT)


solid = part.part
